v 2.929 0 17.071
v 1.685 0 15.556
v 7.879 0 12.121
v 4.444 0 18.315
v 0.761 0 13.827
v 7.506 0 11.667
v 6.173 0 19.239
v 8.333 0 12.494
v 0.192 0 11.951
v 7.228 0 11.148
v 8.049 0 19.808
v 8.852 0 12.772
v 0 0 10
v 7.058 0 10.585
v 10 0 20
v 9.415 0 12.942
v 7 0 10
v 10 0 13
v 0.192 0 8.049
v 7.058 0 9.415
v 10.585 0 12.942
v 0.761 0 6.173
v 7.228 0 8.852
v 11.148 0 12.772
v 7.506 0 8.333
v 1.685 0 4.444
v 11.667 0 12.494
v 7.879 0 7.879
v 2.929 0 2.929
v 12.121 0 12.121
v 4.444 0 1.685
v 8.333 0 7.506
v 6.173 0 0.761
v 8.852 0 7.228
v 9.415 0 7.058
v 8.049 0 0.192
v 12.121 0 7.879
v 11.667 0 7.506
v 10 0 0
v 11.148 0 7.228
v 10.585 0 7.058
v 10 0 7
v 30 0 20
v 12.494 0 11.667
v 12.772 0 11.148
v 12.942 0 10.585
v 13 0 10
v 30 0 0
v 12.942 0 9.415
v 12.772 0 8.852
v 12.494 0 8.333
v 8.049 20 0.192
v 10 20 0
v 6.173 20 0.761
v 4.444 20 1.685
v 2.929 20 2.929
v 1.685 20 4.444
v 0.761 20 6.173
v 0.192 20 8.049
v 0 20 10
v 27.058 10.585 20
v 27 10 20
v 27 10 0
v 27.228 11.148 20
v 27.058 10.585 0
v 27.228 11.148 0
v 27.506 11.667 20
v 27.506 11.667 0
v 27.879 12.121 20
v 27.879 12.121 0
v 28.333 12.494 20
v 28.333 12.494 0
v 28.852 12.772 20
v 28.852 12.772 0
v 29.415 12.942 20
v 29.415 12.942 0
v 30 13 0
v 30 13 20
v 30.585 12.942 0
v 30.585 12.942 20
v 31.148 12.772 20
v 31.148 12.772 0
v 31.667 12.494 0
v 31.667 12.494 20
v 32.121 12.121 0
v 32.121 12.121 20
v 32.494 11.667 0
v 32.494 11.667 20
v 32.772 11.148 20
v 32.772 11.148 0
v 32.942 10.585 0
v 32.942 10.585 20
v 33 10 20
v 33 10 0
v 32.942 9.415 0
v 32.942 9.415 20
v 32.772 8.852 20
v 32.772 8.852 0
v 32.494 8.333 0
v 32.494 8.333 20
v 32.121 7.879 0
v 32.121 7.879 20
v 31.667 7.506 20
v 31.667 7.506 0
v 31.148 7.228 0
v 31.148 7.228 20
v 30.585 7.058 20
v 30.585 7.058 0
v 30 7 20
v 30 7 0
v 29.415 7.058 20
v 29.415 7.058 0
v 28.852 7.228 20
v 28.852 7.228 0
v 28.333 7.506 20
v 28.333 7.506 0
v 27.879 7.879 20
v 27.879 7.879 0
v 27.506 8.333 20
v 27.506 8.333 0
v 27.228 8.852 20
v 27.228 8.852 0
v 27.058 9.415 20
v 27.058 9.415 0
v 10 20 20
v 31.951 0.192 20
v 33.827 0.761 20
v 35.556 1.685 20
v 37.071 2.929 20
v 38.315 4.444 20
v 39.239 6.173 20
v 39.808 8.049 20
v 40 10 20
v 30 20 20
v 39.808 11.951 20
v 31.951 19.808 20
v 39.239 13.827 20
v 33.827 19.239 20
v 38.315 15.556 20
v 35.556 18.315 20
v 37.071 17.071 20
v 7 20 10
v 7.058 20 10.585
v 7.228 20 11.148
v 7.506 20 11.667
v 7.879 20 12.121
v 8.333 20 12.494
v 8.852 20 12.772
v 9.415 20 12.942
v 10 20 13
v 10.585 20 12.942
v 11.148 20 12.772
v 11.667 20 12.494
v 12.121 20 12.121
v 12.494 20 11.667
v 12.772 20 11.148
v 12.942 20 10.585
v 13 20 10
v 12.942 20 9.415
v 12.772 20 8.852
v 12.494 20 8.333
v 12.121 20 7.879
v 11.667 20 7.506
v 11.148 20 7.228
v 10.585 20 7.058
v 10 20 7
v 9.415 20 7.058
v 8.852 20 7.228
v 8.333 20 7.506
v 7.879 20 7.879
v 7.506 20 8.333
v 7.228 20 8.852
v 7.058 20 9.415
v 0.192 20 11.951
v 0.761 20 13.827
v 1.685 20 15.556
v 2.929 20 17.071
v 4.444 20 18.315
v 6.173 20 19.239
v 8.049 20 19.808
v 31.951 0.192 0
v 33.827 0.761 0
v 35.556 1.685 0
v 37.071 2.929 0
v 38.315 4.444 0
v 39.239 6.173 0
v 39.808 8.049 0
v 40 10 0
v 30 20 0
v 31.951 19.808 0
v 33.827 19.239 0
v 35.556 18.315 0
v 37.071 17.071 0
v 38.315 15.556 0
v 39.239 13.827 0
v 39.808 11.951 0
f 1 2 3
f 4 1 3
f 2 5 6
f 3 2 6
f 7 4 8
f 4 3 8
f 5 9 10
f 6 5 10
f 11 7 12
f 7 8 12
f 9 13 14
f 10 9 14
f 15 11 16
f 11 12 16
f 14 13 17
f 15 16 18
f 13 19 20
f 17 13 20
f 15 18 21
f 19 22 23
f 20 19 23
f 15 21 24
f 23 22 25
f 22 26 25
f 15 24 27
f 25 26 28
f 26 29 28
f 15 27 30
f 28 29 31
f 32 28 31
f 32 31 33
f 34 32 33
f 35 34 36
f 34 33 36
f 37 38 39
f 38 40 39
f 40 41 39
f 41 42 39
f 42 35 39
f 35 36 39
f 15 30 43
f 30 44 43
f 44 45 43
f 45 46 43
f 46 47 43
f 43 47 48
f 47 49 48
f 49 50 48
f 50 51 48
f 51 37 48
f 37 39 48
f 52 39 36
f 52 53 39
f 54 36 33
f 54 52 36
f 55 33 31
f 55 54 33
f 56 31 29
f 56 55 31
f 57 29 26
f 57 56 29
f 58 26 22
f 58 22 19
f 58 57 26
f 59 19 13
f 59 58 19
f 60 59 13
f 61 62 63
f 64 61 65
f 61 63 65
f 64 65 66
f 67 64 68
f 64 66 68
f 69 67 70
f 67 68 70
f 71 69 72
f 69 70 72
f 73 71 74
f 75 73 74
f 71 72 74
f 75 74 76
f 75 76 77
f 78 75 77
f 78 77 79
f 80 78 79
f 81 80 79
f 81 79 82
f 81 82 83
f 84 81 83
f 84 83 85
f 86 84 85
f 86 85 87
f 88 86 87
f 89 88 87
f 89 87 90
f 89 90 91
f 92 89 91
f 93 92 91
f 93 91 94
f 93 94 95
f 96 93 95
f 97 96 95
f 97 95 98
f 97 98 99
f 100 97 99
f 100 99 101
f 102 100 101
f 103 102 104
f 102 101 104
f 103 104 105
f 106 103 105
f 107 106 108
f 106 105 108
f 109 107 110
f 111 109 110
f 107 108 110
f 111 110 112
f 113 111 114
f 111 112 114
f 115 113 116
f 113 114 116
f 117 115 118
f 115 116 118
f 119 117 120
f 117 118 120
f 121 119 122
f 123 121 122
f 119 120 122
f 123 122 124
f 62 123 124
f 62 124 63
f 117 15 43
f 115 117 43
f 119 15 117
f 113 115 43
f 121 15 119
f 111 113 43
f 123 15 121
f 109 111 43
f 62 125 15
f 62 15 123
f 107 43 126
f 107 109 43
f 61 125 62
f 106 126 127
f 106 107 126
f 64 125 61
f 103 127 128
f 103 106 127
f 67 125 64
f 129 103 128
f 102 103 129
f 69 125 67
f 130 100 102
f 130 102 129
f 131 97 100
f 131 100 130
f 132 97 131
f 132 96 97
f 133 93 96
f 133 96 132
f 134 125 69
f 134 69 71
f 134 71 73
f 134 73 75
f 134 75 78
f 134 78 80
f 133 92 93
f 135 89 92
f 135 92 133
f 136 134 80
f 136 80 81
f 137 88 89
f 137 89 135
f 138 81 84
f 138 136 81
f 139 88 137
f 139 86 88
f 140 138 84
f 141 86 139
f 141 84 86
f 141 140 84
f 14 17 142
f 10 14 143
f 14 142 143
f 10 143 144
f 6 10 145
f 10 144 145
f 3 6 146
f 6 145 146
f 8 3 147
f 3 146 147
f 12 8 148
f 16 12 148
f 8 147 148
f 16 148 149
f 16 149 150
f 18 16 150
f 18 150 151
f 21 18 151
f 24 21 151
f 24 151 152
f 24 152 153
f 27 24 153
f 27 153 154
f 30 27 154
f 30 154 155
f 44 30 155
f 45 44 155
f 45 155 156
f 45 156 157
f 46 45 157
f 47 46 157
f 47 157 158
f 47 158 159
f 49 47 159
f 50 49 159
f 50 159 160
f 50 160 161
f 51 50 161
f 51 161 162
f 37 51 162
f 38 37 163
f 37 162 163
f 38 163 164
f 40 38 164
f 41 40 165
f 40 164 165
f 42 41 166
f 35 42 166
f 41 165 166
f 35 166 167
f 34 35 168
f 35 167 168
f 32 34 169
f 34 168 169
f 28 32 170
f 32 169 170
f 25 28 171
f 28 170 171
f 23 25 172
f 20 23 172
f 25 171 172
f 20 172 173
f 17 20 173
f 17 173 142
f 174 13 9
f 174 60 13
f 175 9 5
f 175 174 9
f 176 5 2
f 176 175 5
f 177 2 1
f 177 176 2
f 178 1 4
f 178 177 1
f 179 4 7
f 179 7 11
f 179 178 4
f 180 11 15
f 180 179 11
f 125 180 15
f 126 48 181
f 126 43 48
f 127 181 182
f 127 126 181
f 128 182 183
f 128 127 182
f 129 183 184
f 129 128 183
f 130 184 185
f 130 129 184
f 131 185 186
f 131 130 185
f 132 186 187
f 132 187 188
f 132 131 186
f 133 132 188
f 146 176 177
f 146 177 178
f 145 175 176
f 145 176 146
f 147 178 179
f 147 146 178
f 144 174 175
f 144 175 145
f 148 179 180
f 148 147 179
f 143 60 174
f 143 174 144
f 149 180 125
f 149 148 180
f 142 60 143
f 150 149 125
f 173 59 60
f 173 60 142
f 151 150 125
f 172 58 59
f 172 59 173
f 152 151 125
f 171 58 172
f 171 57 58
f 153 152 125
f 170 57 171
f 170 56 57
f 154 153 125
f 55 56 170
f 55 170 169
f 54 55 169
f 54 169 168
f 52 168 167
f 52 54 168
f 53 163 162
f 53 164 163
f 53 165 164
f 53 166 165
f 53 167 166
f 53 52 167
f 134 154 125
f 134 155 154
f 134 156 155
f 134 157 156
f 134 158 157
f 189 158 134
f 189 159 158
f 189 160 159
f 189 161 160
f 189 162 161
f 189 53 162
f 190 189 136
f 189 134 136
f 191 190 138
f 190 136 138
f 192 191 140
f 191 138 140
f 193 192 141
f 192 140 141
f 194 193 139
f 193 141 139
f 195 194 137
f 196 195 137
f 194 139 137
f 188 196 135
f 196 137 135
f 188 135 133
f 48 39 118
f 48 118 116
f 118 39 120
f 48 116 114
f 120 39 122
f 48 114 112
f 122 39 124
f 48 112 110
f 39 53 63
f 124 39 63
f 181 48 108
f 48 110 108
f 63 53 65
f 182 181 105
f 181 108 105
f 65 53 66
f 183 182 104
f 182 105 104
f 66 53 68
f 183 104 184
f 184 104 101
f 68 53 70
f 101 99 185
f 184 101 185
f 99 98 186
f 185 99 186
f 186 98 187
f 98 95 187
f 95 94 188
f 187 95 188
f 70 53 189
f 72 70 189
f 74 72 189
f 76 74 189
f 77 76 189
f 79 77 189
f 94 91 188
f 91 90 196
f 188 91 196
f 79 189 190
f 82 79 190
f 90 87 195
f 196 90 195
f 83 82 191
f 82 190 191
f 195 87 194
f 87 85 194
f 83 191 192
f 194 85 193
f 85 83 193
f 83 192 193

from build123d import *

# Parameters (mm, degrees)
F0_W     = 39.9999970493
F0_H     = 20
F1_DEPTH = 20
F3_D     = 6
F5_D     = 6
F6_R     = 9.99999
F7_R     = 9.99999


# Not quite as in the source:
# - a fillet or chamfer is up to 0.001 mm smaller than in the source, because OpenCascade refuses the exact size


with BuildPart() as f1:
    # F0 (on Top) → F1 (new body)
    with BuildSketch(Plane.XY):
        with Locations((19.9999985246, 10)):
            Rectangle(F0_W, F0_H)
    extrude(amount=F1_DEPTH)

    # F3 (through all)
    with Locations(Plane.XY.offset(20)):
        with Locations((30.0000011921, 10)):
            Hole(F3_D / 2)

    # F5 (through all)
    with Locations(Plane.XZ):
        with Locations((10, 10)):
            Hole(F5_D / 2)

    # F6 (radius 10 in the source; OpenCascade refuses exactly that, so slightly less here)
    f6_edges = [f1.edges().sort_by_distance(p)[0] for p in [
        (39.999997, 0, 10),
        (39.999997, 20, 10),
    ]]
    fillet(f6_edges, radius=F6_R)

    # F7 (radius 10 in the source; OpenCascade refuses exactly that, so slightly less here)
    f7_edges = [f1.edges().sort_by_distance(p)[0] for p in [
        (0, 10, 0),
        (0, 10, 20),
    ]]
    fillet(f7_edges, radius=F7_R)


solid = f1.part
